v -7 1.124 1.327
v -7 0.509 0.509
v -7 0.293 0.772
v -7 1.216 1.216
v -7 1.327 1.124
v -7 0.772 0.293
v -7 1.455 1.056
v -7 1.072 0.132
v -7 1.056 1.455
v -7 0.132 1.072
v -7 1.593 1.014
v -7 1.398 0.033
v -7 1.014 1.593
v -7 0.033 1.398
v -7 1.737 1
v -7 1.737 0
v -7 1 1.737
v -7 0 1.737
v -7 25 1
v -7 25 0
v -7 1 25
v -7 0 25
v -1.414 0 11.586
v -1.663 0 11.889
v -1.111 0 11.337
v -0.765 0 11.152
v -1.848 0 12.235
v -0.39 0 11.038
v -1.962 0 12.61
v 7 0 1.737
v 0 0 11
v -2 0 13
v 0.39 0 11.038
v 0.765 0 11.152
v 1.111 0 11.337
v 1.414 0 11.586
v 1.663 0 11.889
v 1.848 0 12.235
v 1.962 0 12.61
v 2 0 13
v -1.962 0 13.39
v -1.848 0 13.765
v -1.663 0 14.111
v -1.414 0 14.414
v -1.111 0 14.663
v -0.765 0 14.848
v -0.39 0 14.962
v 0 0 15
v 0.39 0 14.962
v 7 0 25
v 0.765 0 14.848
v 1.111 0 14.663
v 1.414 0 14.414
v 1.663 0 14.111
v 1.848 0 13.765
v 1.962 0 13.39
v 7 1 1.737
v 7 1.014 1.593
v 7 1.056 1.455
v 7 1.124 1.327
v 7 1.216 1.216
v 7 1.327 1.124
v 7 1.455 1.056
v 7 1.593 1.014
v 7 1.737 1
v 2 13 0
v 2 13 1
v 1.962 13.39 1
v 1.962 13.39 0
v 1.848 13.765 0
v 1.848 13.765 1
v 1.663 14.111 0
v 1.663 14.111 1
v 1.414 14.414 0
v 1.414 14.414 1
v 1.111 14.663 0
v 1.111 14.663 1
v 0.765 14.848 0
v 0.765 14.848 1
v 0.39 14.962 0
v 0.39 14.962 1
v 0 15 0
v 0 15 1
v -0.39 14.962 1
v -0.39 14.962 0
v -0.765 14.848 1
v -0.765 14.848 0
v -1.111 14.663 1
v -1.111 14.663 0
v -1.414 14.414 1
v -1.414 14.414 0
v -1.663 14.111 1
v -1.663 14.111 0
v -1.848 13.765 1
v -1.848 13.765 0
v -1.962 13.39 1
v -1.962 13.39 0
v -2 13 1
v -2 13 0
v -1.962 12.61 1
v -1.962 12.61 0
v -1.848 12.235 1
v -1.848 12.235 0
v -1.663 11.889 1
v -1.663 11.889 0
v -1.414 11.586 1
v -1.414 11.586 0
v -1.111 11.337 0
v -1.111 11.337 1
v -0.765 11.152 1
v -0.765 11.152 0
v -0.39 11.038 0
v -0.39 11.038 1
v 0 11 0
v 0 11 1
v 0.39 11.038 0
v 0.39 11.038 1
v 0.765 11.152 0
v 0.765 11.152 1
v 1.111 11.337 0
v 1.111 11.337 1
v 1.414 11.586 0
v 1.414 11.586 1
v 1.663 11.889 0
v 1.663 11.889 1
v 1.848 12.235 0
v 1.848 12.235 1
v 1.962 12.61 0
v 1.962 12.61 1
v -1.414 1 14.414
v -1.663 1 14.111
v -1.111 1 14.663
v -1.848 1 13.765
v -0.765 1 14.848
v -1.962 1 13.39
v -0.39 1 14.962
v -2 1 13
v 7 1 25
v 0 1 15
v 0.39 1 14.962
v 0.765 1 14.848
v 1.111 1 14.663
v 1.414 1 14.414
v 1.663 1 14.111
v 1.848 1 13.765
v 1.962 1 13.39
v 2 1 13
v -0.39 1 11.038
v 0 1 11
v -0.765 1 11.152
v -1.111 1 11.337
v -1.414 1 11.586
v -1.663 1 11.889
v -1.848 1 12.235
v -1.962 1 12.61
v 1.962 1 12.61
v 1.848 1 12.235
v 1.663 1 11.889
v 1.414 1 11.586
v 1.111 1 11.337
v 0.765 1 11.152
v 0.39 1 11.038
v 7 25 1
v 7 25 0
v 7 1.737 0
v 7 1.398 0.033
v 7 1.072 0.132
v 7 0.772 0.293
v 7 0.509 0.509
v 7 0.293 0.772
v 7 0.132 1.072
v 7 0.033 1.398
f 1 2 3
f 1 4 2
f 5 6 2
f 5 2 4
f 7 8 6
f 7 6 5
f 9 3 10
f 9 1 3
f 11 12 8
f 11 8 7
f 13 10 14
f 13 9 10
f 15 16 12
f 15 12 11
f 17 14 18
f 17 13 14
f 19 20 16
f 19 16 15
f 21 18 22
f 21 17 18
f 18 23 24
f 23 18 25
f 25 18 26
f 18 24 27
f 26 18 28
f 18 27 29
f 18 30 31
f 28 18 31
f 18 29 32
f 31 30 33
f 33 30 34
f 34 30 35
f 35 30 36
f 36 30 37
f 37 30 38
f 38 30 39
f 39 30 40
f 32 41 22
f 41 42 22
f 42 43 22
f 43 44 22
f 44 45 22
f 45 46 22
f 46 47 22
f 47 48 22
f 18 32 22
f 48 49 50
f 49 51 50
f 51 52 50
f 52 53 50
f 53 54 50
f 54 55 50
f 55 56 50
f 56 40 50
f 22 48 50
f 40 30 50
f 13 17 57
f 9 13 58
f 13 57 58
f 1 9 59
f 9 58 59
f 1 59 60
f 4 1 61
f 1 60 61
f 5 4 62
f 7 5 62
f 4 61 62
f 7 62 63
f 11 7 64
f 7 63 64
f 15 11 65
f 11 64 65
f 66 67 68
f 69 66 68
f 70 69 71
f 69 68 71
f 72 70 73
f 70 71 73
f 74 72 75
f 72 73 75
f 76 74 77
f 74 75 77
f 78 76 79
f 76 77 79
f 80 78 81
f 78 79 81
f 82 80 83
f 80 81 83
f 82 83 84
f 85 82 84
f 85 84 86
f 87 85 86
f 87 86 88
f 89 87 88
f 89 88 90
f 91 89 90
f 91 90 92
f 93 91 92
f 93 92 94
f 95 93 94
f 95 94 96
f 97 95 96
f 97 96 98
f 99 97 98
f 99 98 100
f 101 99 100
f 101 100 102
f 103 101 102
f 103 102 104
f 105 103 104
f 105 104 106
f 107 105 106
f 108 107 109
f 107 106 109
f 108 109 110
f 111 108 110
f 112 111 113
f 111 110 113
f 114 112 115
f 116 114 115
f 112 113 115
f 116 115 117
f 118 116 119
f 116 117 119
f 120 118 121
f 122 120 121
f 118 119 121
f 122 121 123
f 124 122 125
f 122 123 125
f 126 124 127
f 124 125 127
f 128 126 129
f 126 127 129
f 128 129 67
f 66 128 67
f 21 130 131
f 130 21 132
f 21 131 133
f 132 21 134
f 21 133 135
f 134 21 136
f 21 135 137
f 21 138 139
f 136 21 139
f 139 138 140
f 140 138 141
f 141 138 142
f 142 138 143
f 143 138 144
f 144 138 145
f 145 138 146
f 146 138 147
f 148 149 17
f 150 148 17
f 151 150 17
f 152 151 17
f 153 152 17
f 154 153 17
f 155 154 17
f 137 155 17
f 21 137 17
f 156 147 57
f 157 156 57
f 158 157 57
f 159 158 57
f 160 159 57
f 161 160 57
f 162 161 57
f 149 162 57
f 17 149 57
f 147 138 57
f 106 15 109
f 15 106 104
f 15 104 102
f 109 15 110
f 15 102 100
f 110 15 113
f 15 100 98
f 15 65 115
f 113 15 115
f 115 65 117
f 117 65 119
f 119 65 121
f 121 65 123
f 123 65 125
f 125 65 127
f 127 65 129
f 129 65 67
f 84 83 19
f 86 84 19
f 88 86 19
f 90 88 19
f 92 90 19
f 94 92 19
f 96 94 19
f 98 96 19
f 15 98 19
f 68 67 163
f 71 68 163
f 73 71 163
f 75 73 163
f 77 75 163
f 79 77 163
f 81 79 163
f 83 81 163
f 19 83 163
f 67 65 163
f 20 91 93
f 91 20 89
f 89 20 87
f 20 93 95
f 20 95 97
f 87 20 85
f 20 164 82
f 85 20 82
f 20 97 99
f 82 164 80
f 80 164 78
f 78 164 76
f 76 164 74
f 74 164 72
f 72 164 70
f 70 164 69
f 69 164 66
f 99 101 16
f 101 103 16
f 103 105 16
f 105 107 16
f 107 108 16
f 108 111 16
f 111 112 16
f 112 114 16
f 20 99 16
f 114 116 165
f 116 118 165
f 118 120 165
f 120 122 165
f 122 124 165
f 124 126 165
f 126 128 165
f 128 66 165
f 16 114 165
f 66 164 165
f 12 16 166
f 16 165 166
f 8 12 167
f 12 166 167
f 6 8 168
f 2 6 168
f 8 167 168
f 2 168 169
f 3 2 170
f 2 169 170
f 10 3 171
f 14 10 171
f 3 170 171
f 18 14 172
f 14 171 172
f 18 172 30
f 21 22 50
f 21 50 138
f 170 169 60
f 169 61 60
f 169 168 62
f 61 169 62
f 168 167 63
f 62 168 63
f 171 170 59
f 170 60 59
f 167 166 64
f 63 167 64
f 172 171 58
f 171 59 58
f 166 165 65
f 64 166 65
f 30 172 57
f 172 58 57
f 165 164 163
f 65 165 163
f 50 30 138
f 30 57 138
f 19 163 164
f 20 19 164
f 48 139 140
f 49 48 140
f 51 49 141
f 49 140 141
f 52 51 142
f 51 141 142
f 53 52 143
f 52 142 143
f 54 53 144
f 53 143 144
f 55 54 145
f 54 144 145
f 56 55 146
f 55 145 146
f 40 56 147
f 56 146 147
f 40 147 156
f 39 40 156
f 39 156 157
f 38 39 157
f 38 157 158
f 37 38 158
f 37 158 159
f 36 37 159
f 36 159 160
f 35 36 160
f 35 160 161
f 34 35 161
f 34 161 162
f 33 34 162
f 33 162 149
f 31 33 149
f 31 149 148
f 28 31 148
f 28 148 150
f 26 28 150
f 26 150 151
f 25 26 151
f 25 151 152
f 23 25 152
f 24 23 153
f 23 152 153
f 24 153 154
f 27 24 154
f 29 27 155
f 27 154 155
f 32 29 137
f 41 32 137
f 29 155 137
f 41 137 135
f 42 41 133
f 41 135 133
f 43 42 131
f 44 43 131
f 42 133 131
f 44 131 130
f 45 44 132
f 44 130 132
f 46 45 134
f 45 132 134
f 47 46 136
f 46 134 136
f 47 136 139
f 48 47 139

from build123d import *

# Parameters (mm, degrees)
BRIDA_BASE1_DEPTH     = 7
CORTAR_EXTRUIR1_REACH = 37.355
CROQUIS6_R            = 2
CORTAR_EXTRUIR2_REACH = 37.355
CROQUIS9_R            = 2


# Sheet-metal steps are written as plain solids
with BuildPart() as part:
    # Croquis1 → Brida base1 (new, symmetric)
    with BuildSketch(Plane(origin=(0, 0, 0), x_dir=(0, 0, -1), z_dir=(1, 0, 0))):
        with BuildLine():
            Line((0, 25), (0, 1.7366))
            ThreePointArc((0, 1.7366), (-0.508638364, 0.508638364), (-1.7366, 0))
            Line((-1.7366, 0), (-25, 0))
            Line((-25, 0), (-25, 1))
            Line((-25, 1), (-1.7366, 1))
            ThreePointArc((-1.7366, 1), (-1.215745145, 1.215745145), (-1, 1.7366))
            Line((-1, 1.7366), (-1, 25))
            Line((-1, 25), (0, 25))
        make_face()
    extrude(amount=BRIDA_BASE1_DEPTH, both=True)

    # Croquis6 → Cortar-Extruir1 (cut, up to next)
    with BuildSketch(Plane.XY.offset(1), mode=Mode.PRIVATE) as cortar_extruir1_sk1:
        with Locations((0, 13)):
            Circle(CROQUIS6_R)
    cortar_extruir1_tool1 = extrude(cortar_extruir1_sk1.sketch, amount=-CORTAR_EXTRUIR1_REACH, mode=Mode.PRIVATE) & part.part
    add(cortar_extruir1_tool1.solids().sort_by_distance((0, 13, 1))[0], mode=Mode.SUBTRACT)

    # Croquis9 → Cortar-Extruir2 (cut, up to next)
    with BuildSketch(Plane(origin=(0, 1, 0), x_dir=(1, 0, 0), z_dir=(0, 1, 0)), mode=Mode.PRIVATE) as cortar_extruir2_sk1:
        with Locations(Location((0, -13, 0), (0, 0, 270))):
            Circle(CROQUIS9_R)
    cortar_extruir2_tool1 = extrude(cortar_extruir2_sk1.sketch, amount=-CORTAR_EXTRUIR2_REACH, mode=Mode.PRIVATE) & part.part
    add(cortar_extruir2_tool1.solids().sort_by_distance((0, 1, 13))[0], mode=Mode.SUBTRACT)


solid = part.part
